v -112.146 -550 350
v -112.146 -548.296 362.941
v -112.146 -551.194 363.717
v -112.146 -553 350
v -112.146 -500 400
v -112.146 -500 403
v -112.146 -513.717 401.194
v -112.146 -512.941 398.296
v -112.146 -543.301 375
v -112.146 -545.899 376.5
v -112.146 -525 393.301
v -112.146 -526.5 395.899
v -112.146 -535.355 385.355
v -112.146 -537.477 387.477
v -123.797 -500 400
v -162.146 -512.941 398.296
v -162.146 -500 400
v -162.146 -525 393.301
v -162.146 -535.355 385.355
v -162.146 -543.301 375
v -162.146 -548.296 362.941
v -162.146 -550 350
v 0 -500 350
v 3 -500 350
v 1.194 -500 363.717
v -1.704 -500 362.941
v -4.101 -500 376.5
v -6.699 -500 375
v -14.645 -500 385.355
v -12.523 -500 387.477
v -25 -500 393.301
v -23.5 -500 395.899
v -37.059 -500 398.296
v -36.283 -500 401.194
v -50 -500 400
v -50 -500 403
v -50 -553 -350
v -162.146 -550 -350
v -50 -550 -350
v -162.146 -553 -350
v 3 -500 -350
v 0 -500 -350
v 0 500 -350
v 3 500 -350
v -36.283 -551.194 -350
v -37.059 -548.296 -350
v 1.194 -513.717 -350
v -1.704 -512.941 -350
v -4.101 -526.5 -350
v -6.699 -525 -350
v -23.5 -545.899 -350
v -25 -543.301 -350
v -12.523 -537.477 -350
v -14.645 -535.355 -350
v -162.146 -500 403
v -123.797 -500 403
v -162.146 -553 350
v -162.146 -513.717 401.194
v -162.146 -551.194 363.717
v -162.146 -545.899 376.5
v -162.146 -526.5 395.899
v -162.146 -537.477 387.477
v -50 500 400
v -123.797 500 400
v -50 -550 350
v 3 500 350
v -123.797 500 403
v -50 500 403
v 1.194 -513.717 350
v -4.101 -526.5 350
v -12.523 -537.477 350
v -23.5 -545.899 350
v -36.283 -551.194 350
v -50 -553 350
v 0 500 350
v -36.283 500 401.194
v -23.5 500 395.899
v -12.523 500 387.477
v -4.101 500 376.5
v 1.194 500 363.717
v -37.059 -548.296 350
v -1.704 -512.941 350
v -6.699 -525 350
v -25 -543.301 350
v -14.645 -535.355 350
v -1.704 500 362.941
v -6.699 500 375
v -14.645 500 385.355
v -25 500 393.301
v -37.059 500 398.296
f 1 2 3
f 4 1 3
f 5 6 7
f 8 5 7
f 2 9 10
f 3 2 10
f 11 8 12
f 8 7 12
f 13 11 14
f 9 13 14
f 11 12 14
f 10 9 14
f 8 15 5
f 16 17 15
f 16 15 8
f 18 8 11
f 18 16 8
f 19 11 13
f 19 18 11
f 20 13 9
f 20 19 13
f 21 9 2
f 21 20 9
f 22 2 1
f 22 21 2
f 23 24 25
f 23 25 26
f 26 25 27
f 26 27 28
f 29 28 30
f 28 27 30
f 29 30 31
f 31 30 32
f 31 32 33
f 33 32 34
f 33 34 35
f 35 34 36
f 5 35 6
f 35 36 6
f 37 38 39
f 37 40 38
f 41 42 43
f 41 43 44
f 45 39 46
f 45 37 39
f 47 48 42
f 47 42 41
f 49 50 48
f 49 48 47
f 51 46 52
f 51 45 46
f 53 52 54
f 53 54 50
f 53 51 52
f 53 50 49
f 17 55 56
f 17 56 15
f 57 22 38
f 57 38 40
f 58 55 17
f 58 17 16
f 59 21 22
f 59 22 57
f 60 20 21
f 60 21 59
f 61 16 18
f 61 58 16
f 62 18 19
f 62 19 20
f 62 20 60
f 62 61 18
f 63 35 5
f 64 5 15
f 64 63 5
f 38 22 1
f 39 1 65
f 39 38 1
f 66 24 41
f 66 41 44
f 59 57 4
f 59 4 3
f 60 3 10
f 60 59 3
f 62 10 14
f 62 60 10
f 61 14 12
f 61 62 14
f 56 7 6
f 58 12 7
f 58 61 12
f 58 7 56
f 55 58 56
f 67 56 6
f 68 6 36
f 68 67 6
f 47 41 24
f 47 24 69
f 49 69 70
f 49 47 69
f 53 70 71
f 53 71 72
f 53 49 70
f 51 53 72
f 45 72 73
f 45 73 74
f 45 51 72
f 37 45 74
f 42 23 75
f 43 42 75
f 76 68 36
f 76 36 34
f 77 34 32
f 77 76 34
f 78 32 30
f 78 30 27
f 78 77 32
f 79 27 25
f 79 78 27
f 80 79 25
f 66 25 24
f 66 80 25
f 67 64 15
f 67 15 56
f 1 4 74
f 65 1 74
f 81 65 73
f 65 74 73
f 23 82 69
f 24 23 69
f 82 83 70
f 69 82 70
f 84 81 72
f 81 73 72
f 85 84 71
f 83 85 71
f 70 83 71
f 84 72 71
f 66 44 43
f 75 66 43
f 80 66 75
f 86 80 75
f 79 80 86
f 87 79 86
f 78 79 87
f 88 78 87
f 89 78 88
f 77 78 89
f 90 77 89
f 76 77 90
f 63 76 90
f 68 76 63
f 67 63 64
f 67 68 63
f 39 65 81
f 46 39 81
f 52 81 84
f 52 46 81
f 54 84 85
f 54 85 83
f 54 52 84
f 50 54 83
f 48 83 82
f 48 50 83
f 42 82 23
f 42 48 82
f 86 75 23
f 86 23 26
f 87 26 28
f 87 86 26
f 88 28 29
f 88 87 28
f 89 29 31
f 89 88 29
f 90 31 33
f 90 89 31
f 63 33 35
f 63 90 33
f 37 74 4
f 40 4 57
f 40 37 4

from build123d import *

# Parameters (mm, degrees)
F0_W     = 1000
F0_H     = 700
F1_DEPTH = 3
F3_DEPTH = 1000
F5_DEPTH = 700
F7_DEPTH = 50


with BuildPart() as f1:
    # F0 (on Right) → F1 (new body)
    with BuildSketch(Plane.YZ):
        Rectangle(F0_W, F0_H)
    extrude(amount=F1_DEPTH)

    # F2 (on face) → F3 (join)
    with BuildSketch(Plane(origin=(0, 500, 0), x_dir=(-1, 0, 0), z_dir=(0, 1, 0))):
        with BuildLine():
            Line((123.797374, 403), (50, 403))
            ThreePointArc((50, 403), (12.523341, 387.476659), (-3, 350))
            Line((-3, 350), (0, 350))
            ThreePointArc((0, 350), (14.644661, 385.355339), (50, 400))
            Line((50, 400), (123.797374, 400))
            Line((123.797374, 400), (123.797374, 403))
        make_face()
    extrude(amount=-F3_DEPTH)

    # F4 (on face) → F5 (join)
    with BuildSketch(Plane(origin=(0, 0, -350), x_dir=(1, 0, 0), z_dir=(0, 0, -1))):
        with BuildLine():
            Line((-162.145862, 550), (-50, 550))
            ThreePointArc((-50, 550), (-14.644661, 535.355339), (0, 500))
            Line((0, 500), (3, 500))
            ThreePointArc((3, 500), (-12.523341, 537.476659), (-50, 553))
            Line((-50, 553), (-162.145862, 553))
            Line((-162.145862, 553), (-162.145862, 550))
        make_face()
    extrude(amount=-F5_DEPTH)

    # F6 (on face) → F7 (join)
    with BuildSketch(Plane(origin=(-162.145862, 0, 0), x_dir=(0, -1, 0), z_dir=(-1, 0, 0))):
        with BuildLine():
            Line((500, 403), (500, 400))
            ThreePointArc((500, 400), (535.355339, 385.355339), (550, 350))
            Line((550, 350), (553, 350))
            ThreePointArc((553, 350), (537.476659, 387.476659), (500, 403))
        make_face()
    extrude(amount=-F7_DEPTH)


solid = f1.part
